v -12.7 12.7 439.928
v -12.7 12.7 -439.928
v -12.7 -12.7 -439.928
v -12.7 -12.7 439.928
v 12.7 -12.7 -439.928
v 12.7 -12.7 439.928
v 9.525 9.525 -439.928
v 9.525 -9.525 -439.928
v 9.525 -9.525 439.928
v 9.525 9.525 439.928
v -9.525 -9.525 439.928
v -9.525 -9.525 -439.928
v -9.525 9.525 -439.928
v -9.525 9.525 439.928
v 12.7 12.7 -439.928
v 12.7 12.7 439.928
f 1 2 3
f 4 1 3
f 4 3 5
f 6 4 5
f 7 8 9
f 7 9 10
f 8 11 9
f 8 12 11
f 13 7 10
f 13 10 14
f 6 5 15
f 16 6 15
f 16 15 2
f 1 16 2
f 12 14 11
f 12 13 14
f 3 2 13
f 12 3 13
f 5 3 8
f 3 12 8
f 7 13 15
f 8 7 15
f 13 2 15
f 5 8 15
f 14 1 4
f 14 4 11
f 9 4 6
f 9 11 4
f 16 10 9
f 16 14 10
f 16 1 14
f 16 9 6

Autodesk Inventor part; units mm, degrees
ref_plane "YZ Plane" through (0, 0, 0) normal (1, 0, 0) x (0, 1, 0)
ref_plane "XZ Plane" through (0, 0, 0) normal (0, 1, 0) x (-1, 0, 0)
ref_plane "XY Plane" through (0, 0, 0) normal (0, 0, 1) x (1, 0, 0)
sketch "Sketch2" plane through (0, 0, 0) normal (0, 0, 1) x (1, 0, 0)
  line L0 (-12.7, -12.7) -> (12.7, -12.7)
  line L1 (12.7, -12.7) -> (12.7, 12.7)
  line L2 (12.7, 12.7) -> (-12.7, 12.7)
  line L3 (-12.7, 12.7) -> (-12.7, -12.7)
  line L4 (-12.7, -12.7) -> (12.7, 12.7) construction
  line L5 (12.7, -12.7) -> (-12.7, 12.7) construction
  line L6 (-9.525, -9.525) -> (9.525, -9.525)
  line L7 (9.525, -9.525) -> (9.525, 9.525)
  line L8 (9.525, 9.525) -> (-9.525, 9.525)
  line L9 (-9.525, 9.525) -> (-9.525, -9.525)
  line L10 (-9.525, -9.525) -> (9.525, 9.525) construction
  line L11 (9.525, -9.525) -> (-9.525, 9.525) construction
  point P0 (0, 0)
  dimension "d0" = 25.4
  dimension "d1" = 25.4
  dimension "d2" = 3.175
  dimension "d3" = 3.175
extrude "Extrusion1" add sketch "Sketch2" along normal mid plane 879.856
properties part number "aluminumExtrusion" material "Aluminum 6061-AHC"
